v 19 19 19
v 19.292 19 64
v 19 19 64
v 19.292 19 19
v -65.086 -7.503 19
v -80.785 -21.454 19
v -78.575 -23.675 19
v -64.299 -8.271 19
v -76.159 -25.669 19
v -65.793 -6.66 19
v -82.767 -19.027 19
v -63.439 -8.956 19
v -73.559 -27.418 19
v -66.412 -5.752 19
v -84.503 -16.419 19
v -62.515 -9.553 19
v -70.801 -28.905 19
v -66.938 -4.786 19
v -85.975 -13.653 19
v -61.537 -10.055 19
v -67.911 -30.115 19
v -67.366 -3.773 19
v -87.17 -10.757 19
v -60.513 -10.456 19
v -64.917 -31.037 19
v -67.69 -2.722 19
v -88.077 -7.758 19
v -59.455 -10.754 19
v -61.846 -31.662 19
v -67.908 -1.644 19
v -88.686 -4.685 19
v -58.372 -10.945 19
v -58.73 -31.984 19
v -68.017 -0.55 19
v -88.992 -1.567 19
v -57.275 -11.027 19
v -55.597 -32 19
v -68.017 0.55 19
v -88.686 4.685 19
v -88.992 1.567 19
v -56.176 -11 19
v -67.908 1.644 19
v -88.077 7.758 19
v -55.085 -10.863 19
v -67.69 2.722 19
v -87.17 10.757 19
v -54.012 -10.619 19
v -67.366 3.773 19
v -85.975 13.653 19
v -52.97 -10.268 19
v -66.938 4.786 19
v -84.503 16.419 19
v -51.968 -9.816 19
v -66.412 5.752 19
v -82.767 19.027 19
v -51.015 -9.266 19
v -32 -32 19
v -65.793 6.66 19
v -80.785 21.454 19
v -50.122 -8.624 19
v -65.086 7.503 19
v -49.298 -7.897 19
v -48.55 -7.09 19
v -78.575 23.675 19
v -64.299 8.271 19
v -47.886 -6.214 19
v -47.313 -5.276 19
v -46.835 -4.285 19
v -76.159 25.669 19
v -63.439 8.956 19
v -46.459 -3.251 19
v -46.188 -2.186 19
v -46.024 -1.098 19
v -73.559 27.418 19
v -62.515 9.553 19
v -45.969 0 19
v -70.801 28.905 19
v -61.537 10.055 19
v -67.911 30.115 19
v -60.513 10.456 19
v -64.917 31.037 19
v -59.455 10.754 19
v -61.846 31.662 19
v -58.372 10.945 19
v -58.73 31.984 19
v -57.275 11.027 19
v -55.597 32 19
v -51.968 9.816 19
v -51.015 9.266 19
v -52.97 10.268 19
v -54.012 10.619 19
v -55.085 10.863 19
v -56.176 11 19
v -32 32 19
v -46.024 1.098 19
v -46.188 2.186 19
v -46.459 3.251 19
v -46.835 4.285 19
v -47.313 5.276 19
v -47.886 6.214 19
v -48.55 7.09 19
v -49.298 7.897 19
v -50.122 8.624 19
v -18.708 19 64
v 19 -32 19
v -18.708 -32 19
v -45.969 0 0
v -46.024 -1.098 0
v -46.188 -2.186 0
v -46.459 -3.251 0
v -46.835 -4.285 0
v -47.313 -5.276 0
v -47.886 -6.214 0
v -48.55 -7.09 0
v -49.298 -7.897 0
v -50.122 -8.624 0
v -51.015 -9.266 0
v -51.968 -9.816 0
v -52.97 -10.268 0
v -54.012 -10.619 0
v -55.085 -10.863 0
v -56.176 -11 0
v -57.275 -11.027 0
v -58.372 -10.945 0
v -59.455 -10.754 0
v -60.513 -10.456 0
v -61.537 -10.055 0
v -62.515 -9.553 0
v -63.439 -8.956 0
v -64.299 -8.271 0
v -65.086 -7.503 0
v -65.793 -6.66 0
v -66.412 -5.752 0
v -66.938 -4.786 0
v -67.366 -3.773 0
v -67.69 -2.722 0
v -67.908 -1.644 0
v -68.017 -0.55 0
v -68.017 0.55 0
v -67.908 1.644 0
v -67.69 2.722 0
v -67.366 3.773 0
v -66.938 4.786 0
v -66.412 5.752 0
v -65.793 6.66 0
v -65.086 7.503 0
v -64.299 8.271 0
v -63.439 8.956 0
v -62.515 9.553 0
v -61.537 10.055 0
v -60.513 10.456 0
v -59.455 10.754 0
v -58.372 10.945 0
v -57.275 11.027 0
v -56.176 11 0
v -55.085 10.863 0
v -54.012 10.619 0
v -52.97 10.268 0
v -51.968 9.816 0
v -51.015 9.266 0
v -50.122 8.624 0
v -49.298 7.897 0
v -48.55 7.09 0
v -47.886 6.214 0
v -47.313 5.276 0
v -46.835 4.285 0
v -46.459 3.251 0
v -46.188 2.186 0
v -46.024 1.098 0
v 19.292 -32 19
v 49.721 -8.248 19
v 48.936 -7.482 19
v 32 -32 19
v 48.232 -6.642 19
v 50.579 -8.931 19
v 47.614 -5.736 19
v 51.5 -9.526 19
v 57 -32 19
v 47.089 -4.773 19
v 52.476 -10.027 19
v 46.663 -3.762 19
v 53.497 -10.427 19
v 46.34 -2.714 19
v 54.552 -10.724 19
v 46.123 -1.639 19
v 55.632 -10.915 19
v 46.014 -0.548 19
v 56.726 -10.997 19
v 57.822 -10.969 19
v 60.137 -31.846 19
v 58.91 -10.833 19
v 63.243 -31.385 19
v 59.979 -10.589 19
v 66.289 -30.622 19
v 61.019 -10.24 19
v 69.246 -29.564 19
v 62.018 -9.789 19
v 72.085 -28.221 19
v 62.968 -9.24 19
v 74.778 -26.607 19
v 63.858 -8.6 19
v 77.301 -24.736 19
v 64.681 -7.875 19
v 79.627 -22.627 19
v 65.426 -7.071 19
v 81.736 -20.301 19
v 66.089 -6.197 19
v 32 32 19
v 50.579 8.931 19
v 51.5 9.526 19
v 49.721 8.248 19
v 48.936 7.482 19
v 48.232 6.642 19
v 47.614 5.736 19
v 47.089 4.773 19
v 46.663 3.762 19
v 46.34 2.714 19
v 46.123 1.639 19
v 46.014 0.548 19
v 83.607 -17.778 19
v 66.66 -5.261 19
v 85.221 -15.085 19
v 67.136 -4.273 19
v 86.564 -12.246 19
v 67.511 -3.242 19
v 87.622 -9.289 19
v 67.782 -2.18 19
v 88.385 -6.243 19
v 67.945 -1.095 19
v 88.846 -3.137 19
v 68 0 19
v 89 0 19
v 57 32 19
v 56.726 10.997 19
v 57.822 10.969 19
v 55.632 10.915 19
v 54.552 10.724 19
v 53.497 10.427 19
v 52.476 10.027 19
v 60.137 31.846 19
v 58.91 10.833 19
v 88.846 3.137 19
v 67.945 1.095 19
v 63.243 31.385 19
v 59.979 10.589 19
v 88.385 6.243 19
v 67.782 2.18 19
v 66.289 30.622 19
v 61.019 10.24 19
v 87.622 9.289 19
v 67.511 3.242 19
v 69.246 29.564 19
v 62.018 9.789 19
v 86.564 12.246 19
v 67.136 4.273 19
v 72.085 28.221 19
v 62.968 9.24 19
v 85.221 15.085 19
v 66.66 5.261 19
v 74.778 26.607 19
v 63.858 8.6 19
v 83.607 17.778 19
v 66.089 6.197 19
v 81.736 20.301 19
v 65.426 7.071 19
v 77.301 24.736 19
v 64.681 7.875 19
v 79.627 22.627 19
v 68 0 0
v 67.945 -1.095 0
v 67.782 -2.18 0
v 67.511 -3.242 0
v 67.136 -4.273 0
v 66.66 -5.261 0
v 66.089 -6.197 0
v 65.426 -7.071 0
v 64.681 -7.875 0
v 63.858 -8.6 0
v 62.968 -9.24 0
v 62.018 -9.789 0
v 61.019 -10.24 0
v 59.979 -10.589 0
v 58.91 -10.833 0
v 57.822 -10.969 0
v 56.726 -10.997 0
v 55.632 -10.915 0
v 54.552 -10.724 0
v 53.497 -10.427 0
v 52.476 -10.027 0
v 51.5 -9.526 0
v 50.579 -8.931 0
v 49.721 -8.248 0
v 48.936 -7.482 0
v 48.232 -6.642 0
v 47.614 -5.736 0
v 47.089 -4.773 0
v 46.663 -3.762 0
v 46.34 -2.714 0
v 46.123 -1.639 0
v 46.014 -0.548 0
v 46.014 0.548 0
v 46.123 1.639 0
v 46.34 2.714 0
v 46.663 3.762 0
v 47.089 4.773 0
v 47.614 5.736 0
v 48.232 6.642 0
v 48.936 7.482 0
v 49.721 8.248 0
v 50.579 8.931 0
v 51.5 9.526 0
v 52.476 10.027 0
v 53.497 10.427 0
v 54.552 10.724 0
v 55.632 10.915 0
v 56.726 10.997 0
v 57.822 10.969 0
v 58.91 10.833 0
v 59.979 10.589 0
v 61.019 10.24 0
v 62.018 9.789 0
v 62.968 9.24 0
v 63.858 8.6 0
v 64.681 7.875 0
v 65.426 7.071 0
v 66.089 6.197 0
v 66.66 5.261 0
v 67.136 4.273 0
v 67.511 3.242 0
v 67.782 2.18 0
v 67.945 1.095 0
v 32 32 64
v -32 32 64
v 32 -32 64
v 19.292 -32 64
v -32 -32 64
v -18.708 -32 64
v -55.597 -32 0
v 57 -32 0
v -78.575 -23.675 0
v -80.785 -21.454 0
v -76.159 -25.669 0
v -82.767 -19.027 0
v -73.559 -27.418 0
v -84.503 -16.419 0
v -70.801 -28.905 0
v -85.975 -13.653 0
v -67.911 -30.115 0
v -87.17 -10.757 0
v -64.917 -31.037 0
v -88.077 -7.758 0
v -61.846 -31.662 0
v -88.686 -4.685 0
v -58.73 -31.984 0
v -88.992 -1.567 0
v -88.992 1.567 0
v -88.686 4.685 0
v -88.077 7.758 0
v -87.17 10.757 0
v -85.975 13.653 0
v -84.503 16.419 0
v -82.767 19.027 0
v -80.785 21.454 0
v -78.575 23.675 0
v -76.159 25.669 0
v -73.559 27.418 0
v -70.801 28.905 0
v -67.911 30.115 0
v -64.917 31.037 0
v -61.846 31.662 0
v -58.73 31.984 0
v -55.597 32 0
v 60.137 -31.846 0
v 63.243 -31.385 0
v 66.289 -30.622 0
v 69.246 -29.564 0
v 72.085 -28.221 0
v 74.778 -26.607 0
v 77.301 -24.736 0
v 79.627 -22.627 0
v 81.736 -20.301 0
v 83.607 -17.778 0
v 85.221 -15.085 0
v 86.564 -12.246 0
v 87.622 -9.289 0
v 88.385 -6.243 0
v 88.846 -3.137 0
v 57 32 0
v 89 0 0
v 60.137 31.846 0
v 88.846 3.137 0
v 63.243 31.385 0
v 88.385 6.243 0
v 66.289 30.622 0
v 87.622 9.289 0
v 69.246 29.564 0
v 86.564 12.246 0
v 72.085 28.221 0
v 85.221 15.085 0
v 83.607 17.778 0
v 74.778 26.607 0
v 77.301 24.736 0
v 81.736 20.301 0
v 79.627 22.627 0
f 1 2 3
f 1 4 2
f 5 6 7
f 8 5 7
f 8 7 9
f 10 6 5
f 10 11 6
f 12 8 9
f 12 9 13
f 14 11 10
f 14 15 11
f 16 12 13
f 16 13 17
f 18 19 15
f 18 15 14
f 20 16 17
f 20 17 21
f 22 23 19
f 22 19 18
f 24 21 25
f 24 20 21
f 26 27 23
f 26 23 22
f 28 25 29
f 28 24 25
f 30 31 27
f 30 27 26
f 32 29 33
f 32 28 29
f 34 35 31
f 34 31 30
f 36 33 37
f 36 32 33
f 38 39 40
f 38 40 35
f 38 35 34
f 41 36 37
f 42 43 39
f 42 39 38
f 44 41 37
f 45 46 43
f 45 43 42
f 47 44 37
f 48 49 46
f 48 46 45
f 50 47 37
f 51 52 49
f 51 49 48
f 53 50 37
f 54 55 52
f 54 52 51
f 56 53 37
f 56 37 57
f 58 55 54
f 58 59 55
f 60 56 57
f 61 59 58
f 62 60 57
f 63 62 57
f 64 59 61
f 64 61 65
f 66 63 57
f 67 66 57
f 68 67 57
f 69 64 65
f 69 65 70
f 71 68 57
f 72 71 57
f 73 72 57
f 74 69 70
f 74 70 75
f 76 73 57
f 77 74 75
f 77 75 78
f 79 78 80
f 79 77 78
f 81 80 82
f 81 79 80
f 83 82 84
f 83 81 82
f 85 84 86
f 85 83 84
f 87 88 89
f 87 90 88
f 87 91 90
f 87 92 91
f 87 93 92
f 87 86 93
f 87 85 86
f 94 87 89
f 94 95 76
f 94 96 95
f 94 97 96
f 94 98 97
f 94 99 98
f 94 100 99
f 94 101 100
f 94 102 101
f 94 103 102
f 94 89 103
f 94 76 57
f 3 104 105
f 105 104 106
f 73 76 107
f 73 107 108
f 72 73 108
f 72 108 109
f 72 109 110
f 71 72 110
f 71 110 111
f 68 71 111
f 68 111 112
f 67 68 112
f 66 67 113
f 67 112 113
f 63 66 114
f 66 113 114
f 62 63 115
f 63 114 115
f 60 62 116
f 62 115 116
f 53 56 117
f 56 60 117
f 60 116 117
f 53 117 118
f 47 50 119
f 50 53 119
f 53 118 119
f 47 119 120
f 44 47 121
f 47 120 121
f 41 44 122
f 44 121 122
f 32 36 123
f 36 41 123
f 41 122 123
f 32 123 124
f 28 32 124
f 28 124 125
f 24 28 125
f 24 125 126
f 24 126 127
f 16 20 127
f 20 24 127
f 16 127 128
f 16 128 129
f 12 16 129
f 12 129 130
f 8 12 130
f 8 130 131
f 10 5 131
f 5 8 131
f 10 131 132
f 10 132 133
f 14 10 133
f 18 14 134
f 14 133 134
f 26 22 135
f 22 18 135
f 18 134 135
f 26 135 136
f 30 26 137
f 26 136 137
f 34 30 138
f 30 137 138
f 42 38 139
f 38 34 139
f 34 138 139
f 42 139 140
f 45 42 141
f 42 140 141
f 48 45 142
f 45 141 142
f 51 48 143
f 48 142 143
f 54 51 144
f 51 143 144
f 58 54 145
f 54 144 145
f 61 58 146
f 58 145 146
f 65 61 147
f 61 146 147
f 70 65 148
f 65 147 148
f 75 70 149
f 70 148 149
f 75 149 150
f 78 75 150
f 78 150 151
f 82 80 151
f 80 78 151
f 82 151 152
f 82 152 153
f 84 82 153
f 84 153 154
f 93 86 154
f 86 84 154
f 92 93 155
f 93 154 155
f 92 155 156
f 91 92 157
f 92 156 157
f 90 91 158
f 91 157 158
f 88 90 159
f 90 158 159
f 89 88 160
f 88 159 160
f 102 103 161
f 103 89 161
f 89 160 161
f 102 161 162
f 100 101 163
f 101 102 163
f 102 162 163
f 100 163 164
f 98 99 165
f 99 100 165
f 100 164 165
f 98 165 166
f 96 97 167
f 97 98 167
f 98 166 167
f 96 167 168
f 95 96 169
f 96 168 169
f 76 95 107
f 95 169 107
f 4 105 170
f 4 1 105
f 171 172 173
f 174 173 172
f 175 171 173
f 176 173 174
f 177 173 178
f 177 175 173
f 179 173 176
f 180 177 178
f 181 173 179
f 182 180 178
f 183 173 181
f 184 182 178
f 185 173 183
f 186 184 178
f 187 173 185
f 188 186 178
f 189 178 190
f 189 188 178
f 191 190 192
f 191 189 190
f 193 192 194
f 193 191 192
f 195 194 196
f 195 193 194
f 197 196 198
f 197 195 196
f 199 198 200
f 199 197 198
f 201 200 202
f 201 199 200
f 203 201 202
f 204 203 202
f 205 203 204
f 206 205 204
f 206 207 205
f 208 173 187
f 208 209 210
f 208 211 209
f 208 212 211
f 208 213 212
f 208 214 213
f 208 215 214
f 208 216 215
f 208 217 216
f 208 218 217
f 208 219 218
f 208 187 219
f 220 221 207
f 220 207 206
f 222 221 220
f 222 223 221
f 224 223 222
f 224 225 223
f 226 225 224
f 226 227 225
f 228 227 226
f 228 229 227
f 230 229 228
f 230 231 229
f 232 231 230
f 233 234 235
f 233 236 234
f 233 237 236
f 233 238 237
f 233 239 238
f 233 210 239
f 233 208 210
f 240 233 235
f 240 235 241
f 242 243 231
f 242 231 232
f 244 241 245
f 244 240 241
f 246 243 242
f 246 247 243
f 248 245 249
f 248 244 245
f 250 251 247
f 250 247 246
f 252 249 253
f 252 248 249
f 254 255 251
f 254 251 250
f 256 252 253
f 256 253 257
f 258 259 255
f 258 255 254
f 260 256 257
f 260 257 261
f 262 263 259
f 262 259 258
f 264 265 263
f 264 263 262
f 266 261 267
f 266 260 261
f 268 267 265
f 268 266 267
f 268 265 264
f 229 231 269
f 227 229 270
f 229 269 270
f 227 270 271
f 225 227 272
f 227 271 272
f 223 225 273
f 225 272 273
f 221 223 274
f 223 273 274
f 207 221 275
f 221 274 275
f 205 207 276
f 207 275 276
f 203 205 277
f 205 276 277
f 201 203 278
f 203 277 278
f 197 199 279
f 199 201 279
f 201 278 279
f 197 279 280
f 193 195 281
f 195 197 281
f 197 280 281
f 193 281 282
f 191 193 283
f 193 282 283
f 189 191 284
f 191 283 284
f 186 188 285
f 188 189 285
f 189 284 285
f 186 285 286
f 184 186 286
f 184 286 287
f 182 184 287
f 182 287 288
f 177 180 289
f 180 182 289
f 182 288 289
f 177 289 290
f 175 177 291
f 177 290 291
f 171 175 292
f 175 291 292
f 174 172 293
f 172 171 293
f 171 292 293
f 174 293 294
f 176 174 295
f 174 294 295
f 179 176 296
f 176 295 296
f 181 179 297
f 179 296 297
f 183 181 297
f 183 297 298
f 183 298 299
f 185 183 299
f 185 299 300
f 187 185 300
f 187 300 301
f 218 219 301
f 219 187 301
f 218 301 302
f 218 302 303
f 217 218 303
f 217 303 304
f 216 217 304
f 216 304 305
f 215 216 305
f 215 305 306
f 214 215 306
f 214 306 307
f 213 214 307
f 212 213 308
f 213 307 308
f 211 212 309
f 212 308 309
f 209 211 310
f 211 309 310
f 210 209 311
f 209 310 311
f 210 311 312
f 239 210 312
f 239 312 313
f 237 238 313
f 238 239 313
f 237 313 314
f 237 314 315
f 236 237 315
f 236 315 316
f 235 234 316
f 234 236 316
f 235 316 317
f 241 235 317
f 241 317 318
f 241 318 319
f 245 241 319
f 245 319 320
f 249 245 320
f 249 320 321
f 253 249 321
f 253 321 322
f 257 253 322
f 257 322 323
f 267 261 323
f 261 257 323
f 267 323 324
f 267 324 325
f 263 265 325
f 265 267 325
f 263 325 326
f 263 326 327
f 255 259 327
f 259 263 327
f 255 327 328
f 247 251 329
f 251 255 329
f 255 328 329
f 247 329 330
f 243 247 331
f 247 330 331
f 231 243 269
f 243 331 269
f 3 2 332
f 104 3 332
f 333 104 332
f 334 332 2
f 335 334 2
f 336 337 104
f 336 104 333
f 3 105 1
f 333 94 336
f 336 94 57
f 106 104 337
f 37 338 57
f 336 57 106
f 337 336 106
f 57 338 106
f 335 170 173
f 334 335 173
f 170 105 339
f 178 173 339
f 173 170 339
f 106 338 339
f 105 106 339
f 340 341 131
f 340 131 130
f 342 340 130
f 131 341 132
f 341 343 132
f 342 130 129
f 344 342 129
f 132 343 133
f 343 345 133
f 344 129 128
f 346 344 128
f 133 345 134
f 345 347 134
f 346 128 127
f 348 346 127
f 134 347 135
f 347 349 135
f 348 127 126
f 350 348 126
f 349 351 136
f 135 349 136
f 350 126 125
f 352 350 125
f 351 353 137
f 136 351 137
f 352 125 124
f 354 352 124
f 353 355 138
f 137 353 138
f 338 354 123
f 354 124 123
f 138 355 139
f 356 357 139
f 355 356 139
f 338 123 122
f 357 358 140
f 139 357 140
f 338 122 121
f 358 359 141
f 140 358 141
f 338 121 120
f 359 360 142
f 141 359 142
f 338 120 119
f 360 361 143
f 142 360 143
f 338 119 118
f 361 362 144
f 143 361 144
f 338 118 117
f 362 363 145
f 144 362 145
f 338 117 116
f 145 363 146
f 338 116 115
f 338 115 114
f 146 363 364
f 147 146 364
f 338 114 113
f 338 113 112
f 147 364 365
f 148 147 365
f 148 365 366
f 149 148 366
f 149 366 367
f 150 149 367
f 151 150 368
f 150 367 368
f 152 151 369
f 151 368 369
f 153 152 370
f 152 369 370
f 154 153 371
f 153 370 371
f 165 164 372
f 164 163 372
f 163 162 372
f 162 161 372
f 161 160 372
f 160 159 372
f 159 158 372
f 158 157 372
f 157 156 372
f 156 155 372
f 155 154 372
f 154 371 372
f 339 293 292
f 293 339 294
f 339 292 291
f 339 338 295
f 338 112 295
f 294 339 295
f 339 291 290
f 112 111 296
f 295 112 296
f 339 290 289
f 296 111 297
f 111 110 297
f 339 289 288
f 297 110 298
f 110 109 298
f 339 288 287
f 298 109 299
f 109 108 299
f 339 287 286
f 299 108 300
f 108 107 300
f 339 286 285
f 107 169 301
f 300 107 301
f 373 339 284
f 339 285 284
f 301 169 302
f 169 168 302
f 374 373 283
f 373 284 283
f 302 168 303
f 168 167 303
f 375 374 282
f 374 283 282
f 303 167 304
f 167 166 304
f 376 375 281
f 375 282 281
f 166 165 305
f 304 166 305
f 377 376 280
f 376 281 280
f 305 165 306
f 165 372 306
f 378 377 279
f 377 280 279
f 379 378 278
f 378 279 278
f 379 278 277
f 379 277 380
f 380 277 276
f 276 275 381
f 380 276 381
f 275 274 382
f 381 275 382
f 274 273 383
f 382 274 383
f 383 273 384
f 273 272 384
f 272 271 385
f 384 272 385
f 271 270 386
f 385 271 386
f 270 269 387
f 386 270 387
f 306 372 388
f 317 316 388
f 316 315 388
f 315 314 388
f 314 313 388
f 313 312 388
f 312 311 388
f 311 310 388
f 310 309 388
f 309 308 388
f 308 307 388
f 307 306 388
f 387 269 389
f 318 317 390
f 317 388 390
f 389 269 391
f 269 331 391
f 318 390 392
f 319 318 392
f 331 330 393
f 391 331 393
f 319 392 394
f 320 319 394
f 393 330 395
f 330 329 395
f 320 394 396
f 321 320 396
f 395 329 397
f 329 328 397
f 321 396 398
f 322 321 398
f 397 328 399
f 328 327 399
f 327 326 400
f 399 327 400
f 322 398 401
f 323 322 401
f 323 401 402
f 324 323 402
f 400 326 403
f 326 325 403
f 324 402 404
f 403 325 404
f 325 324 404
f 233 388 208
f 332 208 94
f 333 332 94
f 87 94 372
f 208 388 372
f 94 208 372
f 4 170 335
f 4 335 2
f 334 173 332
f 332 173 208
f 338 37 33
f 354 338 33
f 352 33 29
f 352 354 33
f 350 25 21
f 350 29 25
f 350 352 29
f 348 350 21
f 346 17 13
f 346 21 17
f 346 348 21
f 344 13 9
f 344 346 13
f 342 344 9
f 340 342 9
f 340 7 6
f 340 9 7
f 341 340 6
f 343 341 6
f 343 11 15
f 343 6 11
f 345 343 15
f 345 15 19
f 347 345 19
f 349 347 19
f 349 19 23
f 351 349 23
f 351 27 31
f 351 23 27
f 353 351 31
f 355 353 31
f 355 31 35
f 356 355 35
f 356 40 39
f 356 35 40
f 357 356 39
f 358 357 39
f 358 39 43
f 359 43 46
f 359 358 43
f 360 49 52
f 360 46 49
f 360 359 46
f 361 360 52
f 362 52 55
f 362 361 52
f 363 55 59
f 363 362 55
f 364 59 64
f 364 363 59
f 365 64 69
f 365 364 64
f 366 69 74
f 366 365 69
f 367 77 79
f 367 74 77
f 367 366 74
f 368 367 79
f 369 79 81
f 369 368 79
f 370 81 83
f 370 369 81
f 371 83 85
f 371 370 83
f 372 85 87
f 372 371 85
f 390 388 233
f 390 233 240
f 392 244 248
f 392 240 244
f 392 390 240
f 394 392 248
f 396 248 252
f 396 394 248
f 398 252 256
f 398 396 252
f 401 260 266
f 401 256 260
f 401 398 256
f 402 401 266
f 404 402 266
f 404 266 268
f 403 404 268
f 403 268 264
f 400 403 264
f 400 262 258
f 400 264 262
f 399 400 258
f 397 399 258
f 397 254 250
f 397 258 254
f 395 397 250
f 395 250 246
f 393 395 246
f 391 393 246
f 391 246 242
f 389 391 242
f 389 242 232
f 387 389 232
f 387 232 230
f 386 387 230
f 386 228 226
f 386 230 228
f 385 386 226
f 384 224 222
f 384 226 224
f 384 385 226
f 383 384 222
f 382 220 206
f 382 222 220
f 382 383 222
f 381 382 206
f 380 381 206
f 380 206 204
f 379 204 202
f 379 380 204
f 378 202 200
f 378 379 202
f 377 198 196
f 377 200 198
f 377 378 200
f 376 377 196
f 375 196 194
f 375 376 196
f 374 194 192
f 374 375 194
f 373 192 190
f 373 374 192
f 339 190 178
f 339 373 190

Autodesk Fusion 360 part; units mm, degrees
sketch "Base Sketch" plane through (0, 0, 0) normal (0, 0, 1) x (1, 0, 0)
  line L0 (57, 32) -> (-57, 32)
  line L1 (-57, -32) -> (57, -32)
  circle A0 centre (57, 0) radius 11
  circle A1 centre (-57, 0) radius 11.0308
  arc A2 (-55.5967, 32) -> (-55.5967, -32) centre (-57, 0) ccw
  arc A3 (57, -32) -> (57, 32) centre (57, 0) ccw
  dimension "d1" = 114
  dimension "d2" = 64
  dimension "d3" = 64.0615
extrude "Extrude1" add sketch "Base Sketch" along normal blind 19
sketch "Cube Sketch" plane through (0, 0, 19) normal (0, 0, 1) x (-1, 0, 0)
  circle A0 centre (57, 0) radius 11.0308
  circle A1 centre (-57, 0) radius 11
  arc A2 (-57, 32) -> (-57, -32) centre (-57, 0) ccw
  line L0 (-57, -32) -> (55.5967, -32)
  arc A3 (55.5967, -32) -> (55.5967, 32) centre (57, 0) ccw
  line L1 (55.5967, 32) -> (-57, 32)
  line L2 (32, 32) -> (-32, 32)
  line L3 (-32, 32) -> (-32, -32)
  line L4 (-32, -32) -> (32, -32)
  line L5 (32, -32) -> (32, 32)
  line L6 (32, 32) -> (-32, -32) construction
  line L7 (-32, 32) -> (32, -32) construction
  line L8 (18.7079, 32) -> (-19.2921, 32)
  line L9 (-19.2921, 32) -> (-19.2921, -19)
  line L10 (-19.2921, -19) -> (18.7079, -19)
  line L11 (18.7079, -19) -> (18.7079, 32)
  dimension "d8" = 64
  dimension "d9" = 64
  dimension "d10" = 38
  dimension "d11" = 51
sketch "Triangle Sketch" plane through (0, 0, 0) normal (1, 0, 0) x (0, 1, 0)
  line L0 (-32, 19) -> (19, 19)
  line L1 (19, 19) -> (19, 64)
  line L2 (19, 64) -> (-32, 19)
  dimension "d12" = 51
  dimension "d13" = 45
extrude "Extrude2" add sketch "Triangle Sketch" along normal mid plane 38
extrude "Extrude3" add sketch "Cube Sketch" along normal blind 45 contours L0 L1 L2 L3 L4 L5 L9 L10 L11
equation "d2 = ( 32 * 2 ) * 1 mm"
equation "d13 = 64 mm - 19 mm"
